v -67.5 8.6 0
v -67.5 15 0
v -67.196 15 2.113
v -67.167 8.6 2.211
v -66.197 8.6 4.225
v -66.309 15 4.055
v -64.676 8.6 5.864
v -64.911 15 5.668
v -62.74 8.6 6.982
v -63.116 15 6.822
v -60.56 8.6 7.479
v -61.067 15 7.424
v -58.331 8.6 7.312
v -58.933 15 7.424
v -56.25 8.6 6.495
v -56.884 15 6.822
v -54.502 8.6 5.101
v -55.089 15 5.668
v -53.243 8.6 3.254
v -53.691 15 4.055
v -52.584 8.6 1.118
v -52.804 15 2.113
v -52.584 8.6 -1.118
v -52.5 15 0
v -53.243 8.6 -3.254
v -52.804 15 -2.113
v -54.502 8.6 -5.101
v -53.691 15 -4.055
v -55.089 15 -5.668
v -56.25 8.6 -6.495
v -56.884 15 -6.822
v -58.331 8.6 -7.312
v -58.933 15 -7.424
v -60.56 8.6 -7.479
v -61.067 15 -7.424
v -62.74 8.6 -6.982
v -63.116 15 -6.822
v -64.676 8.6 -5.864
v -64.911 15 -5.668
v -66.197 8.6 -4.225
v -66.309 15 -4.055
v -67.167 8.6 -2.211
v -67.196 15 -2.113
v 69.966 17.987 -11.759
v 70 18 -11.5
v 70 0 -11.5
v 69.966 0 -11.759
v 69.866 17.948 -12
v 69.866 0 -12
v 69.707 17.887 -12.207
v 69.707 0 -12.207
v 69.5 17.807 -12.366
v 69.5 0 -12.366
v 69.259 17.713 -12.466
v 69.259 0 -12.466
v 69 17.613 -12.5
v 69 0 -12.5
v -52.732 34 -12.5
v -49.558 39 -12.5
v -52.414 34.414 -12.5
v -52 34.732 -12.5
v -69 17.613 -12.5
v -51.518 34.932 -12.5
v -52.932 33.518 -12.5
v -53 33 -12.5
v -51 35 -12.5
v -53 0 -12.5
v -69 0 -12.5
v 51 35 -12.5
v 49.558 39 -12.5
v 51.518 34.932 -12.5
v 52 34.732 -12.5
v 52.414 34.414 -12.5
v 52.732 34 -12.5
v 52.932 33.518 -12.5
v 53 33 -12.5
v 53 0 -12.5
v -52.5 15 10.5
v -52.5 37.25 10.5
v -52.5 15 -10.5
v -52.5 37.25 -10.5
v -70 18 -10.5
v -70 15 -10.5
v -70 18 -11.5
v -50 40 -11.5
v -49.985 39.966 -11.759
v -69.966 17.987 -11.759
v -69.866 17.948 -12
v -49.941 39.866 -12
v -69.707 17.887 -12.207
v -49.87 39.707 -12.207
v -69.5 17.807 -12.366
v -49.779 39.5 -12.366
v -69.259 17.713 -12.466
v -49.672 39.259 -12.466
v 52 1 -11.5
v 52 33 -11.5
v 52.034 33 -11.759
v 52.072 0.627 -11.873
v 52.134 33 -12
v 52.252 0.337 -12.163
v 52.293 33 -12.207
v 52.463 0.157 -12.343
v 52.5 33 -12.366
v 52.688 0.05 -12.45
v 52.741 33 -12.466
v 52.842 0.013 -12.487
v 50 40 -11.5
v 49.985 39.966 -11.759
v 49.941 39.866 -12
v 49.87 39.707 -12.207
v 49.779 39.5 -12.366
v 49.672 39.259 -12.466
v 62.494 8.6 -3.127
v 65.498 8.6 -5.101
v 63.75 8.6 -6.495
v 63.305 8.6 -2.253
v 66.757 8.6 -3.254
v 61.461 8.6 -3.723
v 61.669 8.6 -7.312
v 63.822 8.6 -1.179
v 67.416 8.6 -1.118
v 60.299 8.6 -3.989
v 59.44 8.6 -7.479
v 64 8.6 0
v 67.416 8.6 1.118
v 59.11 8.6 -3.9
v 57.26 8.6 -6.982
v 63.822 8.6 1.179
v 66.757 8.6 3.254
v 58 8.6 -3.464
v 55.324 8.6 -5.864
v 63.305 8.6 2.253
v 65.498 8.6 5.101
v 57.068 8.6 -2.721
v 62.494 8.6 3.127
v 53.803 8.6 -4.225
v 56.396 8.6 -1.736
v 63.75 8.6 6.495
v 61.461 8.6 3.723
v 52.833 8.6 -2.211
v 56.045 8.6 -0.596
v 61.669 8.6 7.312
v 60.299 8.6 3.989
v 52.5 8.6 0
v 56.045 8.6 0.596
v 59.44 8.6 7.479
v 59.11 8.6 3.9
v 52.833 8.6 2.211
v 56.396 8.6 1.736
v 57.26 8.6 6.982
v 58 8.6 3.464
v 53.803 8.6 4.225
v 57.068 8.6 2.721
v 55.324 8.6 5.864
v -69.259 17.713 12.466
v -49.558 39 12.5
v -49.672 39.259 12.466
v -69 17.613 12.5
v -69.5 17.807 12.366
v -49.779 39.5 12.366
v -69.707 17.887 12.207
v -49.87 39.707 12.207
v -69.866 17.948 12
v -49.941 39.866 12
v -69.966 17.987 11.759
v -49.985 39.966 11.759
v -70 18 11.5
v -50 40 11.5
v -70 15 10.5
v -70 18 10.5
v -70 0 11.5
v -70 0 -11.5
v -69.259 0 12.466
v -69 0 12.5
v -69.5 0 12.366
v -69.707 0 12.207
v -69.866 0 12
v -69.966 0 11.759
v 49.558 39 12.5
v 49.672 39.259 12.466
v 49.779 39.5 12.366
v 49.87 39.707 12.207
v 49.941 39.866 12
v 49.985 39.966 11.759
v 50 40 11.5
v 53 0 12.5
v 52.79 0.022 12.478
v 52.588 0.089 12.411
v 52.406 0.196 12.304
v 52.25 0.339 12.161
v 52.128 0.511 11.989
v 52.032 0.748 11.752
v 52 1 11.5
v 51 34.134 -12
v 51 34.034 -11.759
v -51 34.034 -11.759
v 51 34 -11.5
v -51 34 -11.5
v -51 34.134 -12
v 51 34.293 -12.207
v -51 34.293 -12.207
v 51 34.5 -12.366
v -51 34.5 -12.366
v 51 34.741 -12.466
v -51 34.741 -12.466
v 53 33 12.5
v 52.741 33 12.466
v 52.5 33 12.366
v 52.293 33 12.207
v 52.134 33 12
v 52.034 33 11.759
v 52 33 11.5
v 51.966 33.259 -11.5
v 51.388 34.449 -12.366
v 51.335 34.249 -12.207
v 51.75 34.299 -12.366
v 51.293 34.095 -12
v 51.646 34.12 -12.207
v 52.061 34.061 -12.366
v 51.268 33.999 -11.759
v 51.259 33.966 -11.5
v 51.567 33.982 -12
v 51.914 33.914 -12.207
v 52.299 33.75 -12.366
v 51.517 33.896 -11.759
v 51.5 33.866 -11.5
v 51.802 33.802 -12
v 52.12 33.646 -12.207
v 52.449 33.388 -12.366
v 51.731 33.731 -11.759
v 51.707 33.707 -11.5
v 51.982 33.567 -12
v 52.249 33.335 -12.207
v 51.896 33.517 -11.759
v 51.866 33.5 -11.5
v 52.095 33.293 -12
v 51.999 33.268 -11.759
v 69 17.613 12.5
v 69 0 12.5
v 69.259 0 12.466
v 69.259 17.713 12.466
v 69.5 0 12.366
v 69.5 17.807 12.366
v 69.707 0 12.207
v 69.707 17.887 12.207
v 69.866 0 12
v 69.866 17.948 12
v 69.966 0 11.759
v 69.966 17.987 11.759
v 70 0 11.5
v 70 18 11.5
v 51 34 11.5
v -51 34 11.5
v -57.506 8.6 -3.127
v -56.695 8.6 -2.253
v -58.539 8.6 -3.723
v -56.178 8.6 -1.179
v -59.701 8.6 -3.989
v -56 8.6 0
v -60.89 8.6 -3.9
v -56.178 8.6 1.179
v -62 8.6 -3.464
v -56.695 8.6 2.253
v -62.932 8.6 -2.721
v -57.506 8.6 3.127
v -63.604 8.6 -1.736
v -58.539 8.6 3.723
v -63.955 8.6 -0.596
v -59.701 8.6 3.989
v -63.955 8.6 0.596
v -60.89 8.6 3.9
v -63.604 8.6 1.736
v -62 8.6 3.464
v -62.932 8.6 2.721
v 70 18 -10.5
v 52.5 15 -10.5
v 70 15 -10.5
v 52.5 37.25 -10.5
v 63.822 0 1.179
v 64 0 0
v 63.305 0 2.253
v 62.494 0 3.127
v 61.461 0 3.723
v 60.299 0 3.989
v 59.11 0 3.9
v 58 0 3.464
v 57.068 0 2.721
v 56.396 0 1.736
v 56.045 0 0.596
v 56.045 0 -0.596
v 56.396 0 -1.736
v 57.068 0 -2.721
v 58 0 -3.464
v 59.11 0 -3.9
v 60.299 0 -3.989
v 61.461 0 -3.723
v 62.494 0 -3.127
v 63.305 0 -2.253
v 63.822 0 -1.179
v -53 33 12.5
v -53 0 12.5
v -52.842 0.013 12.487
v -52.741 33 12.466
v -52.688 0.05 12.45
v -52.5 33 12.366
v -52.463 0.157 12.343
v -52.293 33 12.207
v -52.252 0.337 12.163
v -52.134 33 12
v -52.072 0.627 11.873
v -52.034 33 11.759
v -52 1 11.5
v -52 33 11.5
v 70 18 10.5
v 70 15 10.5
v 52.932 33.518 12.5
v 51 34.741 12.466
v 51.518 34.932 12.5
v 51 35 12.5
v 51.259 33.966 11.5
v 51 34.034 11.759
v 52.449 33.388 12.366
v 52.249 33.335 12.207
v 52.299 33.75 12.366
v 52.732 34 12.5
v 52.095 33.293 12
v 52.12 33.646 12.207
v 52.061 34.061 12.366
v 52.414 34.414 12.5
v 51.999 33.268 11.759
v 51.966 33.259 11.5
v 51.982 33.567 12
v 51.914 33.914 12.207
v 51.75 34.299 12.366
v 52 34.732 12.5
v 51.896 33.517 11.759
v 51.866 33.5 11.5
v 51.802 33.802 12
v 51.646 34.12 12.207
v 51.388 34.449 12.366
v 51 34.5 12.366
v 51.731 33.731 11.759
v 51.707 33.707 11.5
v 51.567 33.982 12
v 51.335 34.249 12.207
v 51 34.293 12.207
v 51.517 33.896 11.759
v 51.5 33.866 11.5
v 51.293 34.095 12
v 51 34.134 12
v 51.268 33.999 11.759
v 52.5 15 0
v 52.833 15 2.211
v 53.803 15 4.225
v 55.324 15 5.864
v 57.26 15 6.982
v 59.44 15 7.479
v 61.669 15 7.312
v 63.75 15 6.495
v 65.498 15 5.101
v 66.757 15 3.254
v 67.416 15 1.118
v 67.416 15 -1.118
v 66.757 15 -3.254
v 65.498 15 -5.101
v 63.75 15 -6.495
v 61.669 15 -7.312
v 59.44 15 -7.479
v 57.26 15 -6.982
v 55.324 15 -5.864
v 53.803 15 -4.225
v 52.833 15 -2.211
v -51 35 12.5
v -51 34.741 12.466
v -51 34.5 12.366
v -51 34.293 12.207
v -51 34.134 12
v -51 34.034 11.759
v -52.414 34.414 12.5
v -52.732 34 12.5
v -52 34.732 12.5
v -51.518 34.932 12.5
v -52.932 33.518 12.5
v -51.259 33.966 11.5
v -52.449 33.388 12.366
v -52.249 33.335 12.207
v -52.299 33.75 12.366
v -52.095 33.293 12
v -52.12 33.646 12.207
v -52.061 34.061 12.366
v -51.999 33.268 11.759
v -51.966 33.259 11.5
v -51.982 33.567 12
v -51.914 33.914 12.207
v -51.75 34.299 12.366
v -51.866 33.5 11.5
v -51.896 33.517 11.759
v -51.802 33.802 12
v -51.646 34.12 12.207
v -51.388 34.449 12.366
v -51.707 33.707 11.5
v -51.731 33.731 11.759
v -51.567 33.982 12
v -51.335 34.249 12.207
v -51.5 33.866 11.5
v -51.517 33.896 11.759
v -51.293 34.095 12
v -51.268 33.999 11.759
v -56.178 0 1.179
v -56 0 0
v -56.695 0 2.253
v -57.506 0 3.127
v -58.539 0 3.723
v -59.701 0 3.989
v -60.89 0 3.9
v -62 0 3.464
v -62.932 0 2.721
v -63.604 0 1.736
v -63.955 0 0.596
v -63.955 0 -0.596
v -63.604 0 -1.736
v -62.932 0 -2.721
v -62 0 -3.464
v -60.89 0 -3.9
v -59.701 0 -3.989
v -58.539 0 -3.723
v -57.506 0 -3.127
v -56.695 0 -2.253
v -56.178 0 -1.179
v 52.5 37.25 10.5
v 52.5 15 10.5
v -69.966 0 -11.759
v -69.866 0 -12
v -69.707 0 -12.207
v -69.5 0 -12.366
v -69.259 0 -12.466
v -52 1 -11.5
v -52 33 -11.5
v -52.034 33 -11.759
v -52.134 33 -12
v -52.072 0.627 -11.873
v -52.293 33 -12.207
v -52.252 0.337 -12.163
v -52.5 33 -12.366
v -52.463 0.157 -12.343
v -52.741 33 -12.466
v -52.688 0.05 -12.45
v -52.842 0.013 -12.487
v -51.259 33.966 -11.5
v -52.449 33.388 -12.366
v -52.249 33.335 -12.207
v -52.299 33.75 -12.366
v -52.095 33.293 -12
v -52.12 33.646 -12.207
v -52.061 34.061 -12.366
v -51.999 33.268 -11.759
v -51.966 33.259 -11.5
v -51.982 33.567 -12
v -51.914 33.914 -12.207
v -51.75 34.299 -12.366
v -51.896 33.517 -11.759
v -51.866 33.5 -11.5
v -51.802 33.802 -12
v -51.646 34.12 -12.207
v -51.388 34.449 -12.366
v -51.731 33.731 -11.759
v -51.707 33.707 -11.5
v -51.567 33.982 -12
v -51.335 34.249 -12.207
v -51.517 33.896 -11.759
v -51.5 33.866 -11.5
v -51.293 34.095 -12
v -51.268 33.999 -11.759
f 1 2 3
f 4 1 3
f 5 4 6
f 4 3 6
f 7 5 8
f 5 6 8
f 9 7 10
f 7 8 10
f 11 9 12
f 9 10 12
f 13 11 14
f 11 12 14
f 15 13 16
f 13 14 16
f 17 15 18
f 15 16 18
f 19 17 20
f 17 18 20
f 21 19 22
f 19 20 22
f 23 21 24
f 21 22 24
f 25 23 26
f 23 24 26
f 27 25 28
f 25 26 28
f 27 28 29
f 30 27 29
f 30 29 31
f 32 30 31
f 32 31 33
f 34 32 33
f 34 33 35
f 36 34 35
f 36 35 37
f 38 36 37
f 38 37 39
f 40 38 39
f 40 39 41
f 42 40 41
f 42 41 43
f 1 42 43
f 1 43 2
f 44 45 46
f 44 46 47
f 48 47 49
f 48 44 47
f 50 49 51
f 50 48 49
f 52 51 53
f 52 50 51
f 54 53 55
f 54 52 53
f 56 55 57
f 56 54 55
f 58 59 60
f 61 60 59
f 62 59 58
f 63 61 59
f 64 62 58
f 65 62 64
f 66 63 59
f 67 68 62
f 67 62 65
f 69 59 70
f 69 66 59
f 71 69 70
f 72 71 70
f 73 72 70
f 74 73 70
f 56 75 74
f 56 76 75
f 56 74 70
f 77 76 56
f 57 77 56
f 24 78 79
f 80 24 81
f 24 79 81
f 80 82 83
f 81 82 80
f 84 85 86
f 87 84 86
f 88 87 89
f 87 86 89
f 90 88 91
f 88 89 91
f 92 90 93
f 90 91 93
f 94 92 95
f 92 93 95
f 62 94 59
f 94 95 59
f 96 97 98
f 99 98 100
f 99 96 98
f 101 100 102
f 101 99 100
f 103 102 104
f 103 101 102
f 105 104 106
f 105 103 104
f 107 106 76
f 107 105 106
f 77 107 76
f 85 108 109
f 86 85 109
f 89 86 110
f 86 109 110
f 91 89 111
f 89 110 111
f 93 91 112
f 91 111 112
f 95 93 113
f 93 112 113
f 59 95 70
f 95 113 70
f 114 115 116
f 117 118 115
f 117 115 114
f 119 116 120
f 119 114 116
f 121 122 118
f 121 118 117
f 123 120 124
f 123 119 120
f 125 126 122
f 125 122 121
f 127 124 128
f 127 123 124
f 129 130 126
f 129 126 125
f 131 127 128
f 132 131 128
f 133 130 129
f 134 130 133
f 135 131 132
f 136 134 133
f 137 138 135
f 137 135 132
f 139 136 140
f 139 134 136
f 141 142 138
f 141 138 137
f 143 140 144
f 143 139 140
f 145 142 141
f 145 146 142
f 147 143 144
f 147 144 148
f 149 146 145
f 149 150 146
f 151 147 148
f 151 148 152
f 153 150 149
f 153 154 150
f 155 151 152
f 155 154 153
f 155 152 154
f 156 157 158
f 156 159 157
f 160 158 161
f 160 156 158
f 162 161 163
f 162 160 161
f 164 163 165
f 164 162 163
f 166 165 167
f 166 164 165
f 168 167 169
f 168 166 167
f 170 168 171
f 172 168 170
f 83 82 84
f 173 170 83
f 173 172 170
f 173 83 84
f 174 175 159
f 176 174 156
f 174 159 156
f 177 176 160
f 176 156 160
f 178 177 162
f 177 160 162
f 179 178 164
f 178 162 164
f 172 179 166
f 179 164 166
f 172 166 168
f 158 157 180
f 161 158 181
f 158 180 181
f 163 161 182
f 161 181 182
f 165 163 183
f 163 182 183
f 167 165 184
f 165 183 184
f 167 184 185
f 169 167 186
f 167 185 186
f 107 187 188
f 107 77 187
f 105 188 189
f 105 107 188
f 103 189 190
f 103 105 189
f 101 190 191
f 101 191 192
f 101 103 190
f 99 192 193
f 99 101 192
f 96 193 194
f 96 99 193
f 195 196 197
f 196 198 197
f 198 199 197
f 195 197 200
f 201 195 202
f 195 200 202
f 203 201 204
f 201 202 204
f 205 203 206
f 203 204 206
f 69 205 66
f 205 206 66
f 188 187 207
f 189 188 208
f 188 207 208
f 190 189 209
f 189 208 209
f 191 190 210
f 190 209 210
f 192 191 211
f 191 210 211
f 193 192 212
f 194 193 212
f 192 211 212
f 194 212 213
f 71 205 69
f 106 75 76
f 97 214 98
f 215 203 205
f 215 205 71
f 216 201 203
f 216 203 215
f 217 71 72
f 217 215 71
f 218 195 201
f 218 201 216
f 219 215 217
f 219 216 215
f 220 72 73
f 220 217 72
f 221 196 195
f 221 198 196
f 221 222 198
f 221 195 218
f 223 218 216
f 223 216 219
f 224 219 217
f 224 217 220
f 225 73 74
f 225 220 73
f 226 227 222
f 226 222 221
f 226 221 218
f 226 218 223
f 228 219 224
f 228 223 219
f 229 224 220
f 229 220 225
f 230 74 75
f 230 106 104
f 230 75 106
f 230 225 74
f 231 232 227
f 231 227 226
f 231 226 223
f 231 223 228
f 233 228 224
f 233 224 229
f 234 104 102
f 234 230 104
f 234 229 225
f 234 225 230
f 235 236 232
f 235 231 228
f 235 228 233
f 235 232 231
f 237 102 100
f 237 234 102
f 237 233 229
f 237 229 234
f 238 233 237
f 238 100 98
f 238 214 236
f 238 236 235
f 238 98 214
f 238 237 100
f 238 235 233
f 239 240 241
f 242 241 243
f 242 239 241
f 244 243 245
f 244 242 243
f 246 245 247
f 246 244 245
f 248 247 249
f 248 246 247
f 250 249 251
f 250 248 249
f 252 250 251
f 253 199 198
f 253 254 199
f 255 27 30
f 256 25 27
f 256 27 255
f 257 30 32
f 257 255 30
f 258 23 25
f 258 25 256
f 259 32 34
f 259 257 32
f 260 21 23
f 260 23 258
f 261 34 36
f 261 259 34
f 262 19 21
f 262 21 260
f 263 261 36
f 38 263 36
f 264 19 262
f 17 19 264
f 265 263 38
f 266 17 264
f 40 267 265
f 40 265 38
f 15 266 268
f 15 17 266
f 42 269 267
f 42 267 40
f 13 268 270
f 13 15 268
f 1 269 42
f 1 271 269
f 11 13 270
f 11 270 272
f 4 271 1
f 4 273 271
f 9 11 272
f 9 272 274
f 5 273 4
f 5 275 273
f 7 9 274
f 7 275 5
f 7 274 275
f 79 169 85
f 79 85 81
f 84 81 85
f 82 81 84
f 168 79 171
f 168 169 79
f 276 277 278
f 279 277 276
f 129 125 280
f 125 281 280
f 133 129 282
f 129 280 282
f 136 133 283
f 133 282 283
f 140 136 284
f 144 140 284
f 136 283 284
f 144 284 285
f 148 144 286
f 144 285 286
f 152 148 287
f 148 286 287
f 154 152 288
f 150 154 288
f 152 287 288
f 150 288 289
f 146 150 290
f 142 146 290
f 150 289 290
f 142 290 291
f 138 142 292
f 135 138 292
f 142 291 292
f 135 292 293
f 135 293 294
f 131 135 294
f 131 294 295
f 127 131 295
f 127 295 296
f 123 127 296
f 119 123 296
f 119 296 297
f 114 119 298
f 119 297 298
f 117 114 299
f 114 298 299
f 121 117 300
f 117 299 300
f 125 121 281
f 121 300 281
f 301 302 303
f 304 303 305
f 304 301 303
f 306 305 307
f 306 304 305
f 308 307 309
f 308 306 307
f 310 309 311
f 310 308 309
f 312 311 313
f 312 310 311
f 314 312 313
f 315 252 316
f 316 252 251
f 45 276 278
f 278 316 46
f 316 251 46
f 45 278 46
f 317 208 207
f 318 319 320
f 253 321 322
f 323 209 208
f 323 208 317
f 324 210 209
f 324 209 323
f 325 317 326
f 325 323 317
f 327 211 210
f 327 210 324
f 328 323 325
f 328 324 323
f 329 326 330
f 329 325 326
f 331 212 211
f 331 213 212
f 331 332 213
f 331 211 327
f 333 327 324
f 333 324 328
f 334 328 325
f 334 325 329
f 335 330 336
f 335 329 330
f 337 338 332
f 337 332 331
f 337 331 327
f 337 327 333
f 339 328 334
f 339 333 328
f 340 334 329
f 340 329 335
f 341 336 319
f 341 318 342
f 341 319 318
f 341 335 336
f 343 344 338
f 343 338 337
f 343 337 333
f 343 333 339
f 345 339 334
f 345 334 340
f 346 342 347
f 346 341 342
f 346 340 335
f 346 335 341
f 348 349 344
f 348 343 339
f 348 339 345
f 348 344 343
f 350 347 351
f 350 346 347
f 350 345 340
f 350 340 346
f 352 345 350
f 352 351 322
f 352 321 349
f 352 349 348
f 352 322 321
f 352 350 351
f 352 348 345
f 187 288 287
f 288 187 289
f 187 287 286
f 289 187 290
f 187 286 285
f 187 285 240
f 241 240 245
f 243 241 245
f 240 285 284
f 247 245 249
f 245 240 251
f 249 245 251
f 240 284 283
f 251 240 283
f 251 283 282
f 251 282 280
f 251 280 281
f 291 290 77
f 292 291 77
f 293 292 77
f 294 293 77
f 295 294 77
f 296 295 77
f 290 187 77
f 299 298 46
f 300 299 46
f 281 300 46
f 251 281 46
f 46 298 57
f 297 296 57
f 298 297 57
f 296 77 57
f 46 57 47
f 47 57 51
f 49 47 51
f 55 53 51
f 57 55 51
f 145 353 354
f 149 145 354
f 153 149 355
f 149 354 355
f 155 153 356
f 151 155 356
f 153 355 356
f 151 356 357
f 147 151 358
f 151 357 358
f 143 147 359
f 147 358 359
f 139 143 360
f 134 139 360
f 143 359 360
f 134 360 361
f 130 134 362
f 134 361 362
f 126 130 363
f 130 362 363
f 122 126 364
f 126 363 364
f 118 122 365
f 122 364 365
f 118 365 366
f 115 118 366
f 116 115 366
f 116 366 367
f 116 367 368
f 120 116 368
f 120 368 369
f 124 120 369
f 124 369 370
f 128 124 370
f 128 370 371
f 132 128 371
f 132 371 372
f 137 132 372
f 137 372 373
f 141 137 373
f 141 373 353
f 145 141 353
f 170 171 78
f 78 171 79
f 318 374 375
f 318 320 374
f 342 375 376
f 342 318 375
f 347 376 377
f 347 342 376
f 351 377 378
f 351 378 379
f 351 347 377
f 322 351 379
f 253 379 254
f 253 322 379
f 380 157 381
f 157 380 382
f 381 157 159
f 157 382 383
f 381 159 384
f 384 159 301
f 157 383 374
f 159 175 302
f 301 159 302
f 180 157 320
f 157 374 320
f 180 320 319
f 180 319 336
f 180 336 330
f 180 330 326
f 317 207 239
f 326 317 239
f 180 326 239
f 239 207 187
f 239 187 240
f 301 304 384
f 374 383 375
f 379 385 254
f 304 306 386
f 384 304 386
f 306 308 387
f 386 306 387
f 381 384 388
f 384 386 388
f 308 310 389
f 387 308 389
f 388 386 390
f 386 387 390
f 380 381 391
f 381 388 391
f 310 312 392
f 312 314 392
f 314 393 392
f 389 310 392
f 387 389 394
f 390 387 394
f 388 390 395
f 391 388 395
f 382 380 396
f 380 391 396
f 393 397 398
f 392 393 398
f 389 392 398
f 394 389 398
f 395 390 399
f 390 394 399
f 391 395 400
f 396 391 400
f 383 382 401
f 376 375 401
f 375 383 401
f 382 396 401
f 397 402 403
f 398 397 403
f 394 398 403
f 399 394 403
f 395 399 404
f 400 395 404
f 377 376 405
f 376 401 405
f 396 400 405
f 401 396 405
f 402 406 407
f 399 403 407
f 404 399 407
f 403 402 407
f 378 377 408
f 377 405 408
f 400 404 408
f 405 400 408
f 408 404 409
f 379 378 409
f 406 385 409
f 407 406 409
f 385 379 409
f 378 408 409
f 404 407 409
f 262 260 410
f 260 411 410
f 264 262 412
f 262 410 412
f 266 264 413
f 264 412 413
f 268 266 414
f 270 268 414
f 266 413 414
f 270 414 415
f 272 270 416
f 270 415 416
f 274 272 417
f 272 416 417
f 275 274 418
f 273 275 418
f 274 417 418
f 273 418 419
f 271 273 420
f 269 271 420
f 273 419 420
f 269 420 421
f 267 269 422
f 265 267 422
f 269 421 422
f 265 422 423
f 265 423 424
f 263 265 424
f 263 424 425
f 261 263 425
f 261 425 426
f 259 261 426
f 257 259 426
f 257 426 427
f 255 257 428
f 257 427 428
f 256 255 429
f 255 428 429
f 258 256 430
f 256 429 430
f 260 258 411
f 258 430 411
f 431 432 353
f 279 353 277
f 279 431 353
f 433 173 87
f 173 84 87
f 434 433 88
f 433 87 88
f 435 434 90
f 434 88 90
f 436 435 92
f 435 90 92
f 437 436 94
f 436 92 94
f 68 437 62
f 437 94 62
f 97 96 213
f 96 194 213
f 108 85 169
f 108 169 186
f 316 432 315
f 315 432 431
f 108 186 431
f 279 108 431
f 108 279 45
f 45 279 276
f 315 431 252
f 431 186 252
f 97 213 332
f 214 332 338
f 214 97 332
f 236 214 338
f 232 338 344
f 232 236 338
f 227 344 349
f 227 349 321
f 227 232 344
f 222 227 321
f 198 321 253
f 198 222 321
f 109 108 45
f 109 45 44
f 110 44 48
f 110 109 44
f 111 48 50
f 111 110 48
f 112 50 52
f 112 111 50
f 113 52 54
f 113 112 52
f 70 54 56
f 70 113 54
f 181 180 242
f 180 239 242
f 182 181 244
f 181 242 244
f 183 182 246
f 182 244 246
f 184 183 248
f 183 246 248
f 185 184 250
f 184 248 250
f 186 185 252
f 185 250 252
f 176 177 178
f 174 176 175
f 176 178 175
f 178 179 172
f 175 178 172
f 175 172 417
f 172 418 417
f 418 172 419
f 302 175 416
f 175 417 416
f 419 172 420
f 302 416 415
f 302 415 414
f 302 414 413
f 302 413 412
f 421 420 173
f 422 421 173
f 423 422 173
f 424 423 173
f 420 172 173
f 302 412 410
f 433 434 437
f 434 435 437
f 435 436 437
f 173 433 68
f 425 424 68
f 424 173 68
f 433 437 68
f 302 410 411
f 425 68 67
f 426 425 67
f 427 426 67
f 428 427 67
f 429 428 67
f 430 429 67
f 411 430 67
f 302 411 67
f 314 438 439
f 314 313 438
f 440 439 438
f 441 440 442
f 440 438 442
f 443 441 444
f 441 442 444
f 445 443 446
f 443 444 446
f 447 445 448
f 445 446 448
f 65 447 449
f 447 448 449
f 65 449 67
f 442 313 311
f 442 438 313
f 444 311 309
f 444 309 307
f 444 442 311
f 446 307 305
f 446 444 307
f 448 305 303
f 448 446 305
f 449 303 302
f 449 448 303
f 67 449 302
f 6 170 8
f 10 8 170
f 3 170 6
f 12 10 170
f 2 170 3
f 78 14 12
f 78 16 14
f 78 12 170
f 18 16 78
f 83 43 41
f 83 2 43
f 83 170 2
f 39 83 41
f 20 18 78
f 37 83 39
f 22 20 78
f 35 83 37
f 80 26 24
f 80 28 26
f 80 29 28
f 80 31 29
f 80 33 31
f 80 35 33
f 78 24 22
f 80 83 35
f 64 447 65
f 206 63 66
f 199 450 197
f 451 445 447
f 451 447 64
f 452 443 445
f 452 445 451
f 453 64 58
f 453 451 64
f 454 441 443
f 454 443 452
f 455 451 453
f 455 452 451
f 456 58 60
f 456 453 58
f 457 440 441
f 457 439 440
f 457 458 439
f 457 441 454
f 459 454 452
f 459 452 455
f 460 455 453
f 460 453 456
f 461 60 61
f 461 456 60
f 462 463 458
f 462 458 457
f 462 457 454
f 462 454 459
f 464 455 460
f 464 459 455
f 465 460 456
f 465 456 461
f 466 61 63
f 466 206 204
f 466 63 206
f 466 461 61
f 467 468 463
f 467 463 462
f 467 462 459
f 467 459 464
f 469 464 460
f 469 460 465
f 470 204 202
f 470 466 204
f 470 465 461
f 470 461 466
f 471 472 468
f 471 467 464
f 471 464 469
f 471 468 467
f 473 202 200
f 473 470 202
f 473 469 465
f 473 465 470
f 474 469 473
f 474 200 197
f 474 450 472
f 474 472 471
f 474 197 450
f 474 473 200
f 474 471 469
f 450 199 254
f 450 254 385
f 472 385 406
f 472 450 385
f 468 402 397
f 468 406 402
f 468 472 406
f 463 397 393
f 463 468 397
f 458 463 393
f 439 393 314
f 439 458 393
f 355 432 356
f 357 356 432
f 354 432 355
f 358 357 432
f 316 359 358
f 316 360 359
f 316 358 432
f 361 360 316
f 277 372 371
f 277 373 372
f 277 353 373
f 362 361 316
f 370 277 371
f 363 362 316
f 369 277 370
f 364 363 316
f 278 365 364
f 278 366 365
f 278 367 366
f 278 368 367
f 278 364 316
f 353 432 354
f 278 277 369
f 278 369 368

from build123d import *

# Parameters (mm, degrees)
SKETCH_1_W                   = 140
SKETCH_1_H                   = 25
EXTRUDE_1_DEPTH              = 40
SKETCH_2_W                   = 104
SKETCH_2_H                   = 34
CUT_EXTRUDE_1_DEPTH          = 85.409715081
SKETCH_3_W                   = 17.5
SKETCH_3_H                   = 21
CUT_EXTRUDE_2_DEPTH          = 25
HOLE_WIZARD_M6_1_D           = 8
HOLE_WIZARD_M6_1_CBORE_D     = 15
HOLE_WIZARD_M6_1_CBORE_DEPTH = 6.4
FILLET_1_R                   = 1
FILLET_2_R                   = 1


with BuildPart() as part:
    # 草图1 → 凸台-拉伸1 (new body)
    with BuildSketch(Plane(origin=(0, 0, 0), x_dir=(1, 0, 0), z_dir=(0, 1, 0))):
        Rectangle(SKETCH_1_W, SKETCH_1_H)
    extrude(amount=EXTRUDE_1_DEPTH)

    # 草图2 → 切除-拉伸1 (cut, through all)
    with BuildSketch(Plane.XY.offset(12.5)):
        with Locations((0, 17)):
            Rectangle(SKETCH_2_W, SKETCH_2_H)
        Polygon((-70, 40), (-50, 40), (-70, 18), align=None)
        Polygon((70, 40), (50, 40), (70, 18), align=None)
    extrude(amount=-CUT_EXTRUDE_1_DEPTH, mode=Mode.SUBTRACT)

    # 草图3 → 切除-拉伸2 (cut)
    with BuildSketch(Plane(origin=(0, 40, 0), x_dir=(1, 0, 0), z_dir=(0, 1, 0))):
        with Locations((-61.25, 0)):
            Rectangle(SKETCH_3_W, SKETCH_3_H)
        with Locations((61.25, 0)):
            Rectangle(SKETCH_3_W, SKETCH_3_H)
    extrude(amount=-CUT_EXTRUDE_2_DEPTH, mode=Mode.SUBTRACT)

    # M6 六角凹头螺钉的柱形沉头孔1 (through all)
    with Locations(Plane(origin=(0, 15, 0), x_dir=(-1, 0, 0), z_dir=(0, 1, 0))):
        with Locations((60, 0), (-60, 0)):
            CounterBoreHole(HOLE_WIZARD_M6_1_D / 2, HOLE_WIZARD_M6_1_CBORE_D / 2, HOLE_WIZARD_M6_1_CBORE_DEPTH)

    # 圆角1
    fillet_1_edges = [part.edges().sort_by_distance(p)[0] for p in [
        (-52, 17, -12.5),
        (-52, 0, 0),
        (0, 34, -12.5),
        (-52, 34, 0),
        (52, 17, -12.5),
        (52, 34, 0),
        (52, 0, 0),
        (-52, 17, 12.5),
        (52, 17, 12.5),
        (0, 34, 12.5),
    ]]
    fillet(fillet_1_edges, radius=FILLET_1_R)

    # 圆角2
    fillet_2_edges = [part.edges().sort_by_distance(p)[0] for p in [
        (0, 40, 12.5),
        (-70, 9, -12.5),
        (-70, 9, 12.5),
        (-60, 29, -12.5),
        (-60, 29, 12.5),
        (0, 40, -12.5),
        (70, 9, -12.5),
        (70, 9, 12.5),
        (60, 29, -12.5),
        (60, 29, 12.5),
    ]]
    fillet(fillet_2_edges, radius=FILLET_2_R)


solid = part.part
